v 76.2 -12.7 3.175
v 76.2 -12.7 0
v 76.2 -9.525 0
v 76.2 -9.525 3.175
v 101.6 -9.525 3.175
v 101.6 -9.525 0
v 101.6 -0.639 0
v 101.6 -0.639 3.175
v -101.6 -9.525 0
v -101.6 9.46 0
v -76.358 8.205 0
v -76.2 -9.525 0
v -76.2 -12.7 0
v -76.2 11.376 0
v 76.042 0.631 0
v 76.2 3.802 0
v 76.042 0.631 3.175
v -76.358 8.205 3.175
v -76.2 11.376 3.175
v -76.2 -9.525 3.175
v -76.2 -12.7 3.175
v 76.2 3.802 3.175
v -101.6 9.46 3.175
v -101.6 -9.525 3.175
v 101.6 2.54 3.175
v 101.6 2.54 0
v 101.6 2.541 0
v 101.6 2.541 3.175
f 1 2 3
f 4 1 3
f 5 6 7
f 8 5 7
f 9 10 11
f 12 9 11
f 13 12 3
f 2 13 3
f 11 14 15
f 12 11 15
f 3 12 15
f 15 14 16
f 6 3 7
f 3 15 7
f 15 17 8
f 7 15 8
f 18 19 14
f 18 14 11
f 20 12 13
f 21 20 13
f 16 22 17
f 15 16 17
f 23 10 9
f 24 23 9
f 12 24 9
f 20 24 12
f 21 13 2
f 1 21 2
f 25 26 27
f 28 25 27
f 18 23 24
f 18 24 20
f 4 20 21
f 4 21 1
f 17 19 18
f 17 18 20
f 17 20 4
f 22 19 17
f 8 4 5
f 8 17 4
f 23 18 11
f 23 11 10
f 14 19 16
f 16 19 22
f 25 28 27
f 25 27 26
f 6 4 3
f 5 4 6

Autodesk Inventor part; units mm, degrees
ref_plane "YZ Plane" through (0, 0, 0) normal (1, 0, 0) x (0, 1, 0)
ref_plane "XZ Plane" through (0, 0, 0) normal (0, 1, 0) x (-1, 0, 0)
ref_plane "XY Plane" through (0, 0, 0) normal (0, 0, 1) x (1, 0, 0)
sketch "Sketch1" plane through (0, 0, 0) normal (0, 0, 1) x (1, 0, 0)
  line L0 (-101.6, -12.7) -> (101.6, -12.7)
  line L1 (101.6, -12.7) -> (101.6, 12.7)
  line L2 (101.6, 12.7) -> (-101.6, 12.7)
  line L3 (-101.6, 12.7) -> (-101.6, -12.7)
  line L4 (-101.6, -12.7) -> (101.6, 12.7) construction
  line L5 (101.6, -12.7) -> (-101.6, 12.7) construction
  point P0 (0, 0)
  dimension "d0" = 203.2
  dimension "d1" = 25.4
extrude "Extrusion1" add sketch "Sketch1" along normal blind 3.175
sketch "Sketch2" plane through (0, 0, 3.175) normal (0, 0, 1) x (1, 0, 0)
  line L0 (-101.6, -12.7) -> (101.6, -12.7) projected
  line L1 (-101.6, 12.6386) -> (101.5996, 2.54)
  line L2 (-101.6, 12.6386) -> (-115.0985, 49.6806)
  line L3 (-115.0985, 49.6806) -> (129.2537, 40.5846)
  line L4 (129.2537, 40.5846) -> (101.5996, 2.54)
  point P0 (0, 0)
  dimension "d4" = 15.24
extrude "Extrusion2" cut sketch "Sketch2" against normal blind 3.175
sketch "Sketch3" plane through (0, 0, 3.175) normal (0, 0, 1) x (1, 0, 0)
  line L0 (-76.2, 11.3763) -> (-78.9338, 11.5121)
  line L1 (-76.2, 11.3763) -> (-76.3576, 8.2052)
  line L2 (76.1996, 3.8023) -> (76.042, 0.6312)
  line L3 (-76.3576, 8.2052) -> (-113.4193, 10.0471)
  line L4 (-101.6, 12.6386) -> (-113.4193, 10.0471)
  line L5 (76.042, 0.6312) -> (108.1145, -0.9627)
  line L6 (101.5996, 2.54) -> (108.1145, -0.9627)
  line L7 (-76.2, 11.3763) -> (-101.6, 12.6386)
  line L8 (76.1996, 3.8023) -> (101.5996, 2.54)
  point P0 (0, 0)
  point P1 (-81.4529, 11.6373)
  point P2 (-101.6, -12.7664)
  dimension "d7" = 25.4
  dimension "d8" = 3.175
  dimension "d10" = 25.4
  dimension "d11" = 3.175
  dimension "d13" = 90
  dimension "d14" = 90
extrude "Extrusion3" cut sketch "Sketch3" against normal blind 3.175
sketch "Sketch4" plane through (0, 0, 3.175) normal (0, 0, 1) x (1, 0, 0)
  line L0 (-101.6, -12.7) -> (-101.6, -9.525)
  line L1 (-101.6, -9.525) -> (-76.2, -9.525)
  line L2 (-76.2, -9.525) -> (-76.2, -12.7)
  line L3 (-76.2, -12.7) -> (-101.6, -12.7)
  line L4 (101.6, -12.7) -> (76.2, -12.7)
  line L5 (76.2, -12.7) -> (76.2, -9.525)
  line L6 (76.2, -9.525) -> (101.6, -9.525)
  line L7 (101.6, -12.7) -> (101.6, -0.6389) projected
  line L8 (101.6, -9.525) -> (101.6, -12.7)
  point P0 (0, 0)
extrude "Extrusion4" cut sketch "Sketch4" against normal blind 3.175
properties part number "side board"
